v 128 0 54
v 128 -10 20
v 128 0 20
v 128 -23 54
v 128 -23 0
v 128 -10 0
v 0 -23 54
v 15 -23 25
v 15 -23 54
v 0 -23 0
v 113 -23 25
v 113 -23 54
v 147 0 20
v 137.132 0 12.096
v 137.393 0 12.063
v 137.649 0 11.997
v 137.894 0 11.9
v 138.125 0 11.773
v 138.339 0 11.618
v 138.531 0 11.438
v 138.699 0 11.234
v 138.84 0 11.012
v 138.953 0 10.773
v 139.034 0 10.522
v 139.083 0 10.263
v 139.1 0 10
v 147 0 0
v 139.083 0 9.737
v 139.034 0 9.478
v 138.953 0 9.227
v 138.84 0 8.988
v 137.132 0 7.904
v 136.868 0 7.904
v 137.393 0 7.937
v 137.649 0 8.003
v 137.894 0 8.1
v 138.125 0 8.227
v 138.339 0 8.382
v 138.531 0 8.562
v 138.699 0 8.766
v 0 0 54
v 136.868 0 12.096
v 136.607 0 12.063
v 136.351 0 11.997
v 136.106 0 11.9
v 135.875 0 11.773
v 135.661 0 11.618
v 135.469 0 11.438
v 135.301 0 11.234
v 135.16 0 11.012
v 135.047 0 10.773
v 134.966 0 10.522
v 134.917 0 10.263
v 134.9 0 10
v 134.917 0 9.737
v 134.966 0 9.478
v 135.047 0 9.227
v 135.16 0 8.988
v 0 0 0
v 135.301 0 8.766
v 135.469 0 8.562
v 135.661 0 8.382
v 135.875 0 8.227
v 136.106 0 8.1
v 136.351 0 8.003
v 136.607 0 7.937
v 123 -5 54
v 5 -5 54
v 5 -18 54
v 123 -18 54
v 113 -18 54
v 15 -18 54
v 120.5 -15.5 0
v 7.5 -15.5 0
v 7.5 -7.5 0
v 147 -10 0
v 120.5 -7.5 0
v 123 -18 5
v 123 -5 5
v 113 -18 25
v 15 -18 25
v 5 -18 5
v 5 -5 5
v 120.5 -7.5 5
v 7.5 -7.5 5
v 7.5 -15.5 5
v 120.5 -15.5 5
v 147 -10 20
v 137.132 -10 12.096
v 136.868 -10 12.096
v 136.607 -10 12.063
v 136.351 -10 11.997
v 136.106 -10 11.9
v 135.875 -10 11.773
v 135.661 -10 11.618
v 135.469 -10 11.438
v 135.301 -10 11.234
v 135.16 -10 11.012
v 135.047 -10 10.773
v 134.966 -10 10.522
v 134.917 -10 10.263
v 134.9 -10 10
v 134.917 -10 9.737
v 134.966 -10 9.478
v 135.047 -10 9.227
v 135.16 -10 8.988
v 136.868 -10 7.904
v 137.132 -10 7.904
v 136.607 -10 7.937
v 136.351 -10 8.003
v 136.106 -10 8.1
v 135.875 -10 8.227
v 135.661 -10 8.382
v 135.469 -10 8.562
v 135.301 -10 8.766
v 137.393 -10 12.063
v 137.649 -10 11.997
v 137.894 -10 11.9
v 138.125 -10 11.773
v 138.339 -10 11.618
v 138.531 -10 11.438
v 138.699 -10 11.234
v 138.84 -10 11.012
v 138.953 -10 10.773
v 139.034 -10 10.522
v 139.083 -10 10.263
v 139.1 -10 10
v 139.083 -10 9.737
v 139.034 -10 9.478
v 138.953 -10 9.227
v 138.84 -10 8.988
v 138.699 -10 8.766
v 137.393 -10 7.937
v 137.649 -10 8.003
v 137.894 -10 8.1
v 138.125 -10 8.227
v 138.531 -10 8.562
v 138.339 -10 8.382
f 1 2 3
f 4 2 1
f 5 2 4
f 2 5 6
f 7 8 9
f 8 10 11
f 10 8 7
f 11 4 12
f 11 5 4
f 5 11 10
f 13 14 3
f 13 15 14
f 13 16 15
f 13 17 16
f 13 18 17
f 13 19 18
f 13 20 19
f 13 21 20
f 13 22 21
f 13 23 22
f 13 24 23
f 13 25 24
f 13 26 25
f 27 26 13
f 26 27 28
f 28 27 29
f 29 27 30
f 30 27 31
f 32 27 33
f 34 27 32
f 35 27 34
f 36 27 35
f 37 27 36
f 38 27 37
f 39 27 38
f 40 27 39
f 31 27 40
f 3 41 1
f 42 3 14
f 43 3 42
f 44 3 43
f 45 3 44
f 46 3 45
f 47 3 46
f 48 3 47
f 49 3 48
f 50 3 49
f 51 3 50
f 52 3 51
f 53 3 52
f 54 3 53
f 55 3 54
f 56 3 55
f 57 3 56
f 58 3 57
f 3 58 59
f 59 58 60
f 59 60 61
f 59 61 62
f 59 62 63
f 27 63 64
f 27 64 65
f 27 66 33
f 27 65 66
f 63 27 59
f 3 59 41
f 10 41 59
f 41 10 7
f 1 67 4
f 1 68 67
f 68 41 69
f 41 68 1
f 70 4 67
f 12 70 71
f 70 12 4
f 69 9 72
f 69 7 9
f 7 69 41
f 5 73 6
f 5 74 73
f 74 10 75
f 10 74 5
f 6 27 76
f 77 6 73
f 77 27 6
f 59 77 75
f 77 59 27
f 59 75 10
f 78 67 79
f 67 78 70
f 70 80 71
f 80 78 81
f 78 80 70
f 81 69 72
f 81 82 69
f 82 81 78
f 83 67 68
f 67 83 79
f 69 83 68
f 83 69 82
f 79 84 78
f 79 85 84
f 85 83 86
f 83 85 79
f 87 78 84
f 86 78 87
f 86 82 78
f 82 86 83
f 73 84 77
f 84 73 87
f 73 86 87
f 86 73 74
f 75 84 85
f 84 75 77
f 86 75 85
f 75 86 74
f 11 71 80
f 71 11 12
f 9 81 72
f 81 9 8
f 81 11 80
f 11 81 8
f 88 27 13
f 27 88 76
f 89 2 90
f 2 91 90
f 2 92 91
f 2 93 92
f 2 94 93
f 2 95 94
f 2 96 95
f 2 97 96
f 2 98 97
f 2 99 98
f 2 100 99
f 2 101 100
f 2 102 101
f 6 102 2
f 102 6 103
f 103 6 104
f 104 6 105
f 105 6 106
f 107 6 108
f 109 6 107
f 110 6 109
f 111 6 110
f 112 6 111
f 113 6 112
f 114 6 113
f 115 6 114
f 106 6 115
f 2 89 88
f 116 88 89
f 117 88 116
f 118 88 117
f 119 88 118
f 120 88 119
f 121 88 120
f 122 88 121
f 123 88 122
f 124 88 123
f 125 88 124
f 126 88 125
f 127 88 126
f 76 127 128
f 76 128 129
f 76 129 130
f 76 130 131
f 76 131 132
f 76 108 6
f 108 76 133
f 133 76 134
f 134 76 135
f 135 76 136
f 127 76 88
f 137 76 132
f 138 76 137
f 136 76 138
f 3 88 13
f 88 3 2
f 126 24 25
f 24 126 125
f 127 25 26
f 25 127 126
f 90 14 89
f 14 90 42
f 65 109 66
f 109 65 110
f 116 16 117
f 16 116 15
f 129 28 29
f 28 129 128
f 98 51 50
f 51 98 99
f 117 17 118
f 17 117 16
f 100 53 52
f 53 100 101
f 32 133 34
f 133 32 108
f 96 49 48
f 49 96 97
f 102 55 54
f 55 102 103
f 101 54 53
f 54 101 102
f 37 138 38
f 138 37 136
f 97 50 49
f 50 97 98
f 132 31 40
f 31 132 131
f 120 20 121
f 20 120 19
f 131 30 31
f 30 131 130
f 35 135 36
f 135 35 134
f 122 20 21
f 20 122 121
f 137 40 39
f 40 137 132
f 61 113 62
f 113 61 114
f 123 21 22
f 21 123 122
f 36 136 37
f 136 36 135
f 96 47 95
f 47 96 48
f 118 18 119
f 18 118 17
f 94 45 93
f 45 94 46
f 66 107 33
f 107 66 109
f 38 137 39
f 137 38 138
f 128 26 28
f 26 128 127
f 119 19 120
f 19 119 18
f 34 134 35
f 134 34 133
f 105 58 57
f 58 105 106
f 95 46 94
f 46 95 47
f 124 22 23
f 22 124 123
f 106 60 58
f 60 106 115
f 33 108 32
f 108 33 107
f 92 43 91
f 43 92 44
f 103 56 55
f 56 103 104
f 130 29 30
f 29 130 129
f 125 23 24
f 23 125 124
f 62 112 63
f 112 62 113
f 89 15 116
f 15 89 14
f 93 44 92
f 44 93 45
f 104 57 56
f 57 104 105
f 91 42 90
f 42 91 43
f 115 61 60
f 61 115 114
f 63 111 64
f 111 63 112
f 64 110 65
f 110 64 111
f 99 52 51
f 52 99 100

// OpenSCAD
// copyright Free Beachler, Longevity Software LLC d.b.a. Terawatt Industries

//acerA100();
rotate([90, 0, 0]) tabletMount();

module tabletMount() {
	difference() {
		cube([128, 54, 23]);
		translate([5, 5, 5]) cube([118, 54, 13]);
		translate([7.5, -5, 7.5]) cube([113, 54, 8]);
		translate([15, 25, 15]) cube([98, 54, 13]);
	}
	difference() {
		// mount tab
		translate([127, 0, 0]) cube([20, 20, 10]);
		translate([137, 10, -1]) rotate([0, 0, 0]) cylinder(r = 2.1, h = 12, center = false, $fn = 50);
	}
}

module acerA100() {
  color([0, 0, 0]) cube([118, 194, 13]);
}
